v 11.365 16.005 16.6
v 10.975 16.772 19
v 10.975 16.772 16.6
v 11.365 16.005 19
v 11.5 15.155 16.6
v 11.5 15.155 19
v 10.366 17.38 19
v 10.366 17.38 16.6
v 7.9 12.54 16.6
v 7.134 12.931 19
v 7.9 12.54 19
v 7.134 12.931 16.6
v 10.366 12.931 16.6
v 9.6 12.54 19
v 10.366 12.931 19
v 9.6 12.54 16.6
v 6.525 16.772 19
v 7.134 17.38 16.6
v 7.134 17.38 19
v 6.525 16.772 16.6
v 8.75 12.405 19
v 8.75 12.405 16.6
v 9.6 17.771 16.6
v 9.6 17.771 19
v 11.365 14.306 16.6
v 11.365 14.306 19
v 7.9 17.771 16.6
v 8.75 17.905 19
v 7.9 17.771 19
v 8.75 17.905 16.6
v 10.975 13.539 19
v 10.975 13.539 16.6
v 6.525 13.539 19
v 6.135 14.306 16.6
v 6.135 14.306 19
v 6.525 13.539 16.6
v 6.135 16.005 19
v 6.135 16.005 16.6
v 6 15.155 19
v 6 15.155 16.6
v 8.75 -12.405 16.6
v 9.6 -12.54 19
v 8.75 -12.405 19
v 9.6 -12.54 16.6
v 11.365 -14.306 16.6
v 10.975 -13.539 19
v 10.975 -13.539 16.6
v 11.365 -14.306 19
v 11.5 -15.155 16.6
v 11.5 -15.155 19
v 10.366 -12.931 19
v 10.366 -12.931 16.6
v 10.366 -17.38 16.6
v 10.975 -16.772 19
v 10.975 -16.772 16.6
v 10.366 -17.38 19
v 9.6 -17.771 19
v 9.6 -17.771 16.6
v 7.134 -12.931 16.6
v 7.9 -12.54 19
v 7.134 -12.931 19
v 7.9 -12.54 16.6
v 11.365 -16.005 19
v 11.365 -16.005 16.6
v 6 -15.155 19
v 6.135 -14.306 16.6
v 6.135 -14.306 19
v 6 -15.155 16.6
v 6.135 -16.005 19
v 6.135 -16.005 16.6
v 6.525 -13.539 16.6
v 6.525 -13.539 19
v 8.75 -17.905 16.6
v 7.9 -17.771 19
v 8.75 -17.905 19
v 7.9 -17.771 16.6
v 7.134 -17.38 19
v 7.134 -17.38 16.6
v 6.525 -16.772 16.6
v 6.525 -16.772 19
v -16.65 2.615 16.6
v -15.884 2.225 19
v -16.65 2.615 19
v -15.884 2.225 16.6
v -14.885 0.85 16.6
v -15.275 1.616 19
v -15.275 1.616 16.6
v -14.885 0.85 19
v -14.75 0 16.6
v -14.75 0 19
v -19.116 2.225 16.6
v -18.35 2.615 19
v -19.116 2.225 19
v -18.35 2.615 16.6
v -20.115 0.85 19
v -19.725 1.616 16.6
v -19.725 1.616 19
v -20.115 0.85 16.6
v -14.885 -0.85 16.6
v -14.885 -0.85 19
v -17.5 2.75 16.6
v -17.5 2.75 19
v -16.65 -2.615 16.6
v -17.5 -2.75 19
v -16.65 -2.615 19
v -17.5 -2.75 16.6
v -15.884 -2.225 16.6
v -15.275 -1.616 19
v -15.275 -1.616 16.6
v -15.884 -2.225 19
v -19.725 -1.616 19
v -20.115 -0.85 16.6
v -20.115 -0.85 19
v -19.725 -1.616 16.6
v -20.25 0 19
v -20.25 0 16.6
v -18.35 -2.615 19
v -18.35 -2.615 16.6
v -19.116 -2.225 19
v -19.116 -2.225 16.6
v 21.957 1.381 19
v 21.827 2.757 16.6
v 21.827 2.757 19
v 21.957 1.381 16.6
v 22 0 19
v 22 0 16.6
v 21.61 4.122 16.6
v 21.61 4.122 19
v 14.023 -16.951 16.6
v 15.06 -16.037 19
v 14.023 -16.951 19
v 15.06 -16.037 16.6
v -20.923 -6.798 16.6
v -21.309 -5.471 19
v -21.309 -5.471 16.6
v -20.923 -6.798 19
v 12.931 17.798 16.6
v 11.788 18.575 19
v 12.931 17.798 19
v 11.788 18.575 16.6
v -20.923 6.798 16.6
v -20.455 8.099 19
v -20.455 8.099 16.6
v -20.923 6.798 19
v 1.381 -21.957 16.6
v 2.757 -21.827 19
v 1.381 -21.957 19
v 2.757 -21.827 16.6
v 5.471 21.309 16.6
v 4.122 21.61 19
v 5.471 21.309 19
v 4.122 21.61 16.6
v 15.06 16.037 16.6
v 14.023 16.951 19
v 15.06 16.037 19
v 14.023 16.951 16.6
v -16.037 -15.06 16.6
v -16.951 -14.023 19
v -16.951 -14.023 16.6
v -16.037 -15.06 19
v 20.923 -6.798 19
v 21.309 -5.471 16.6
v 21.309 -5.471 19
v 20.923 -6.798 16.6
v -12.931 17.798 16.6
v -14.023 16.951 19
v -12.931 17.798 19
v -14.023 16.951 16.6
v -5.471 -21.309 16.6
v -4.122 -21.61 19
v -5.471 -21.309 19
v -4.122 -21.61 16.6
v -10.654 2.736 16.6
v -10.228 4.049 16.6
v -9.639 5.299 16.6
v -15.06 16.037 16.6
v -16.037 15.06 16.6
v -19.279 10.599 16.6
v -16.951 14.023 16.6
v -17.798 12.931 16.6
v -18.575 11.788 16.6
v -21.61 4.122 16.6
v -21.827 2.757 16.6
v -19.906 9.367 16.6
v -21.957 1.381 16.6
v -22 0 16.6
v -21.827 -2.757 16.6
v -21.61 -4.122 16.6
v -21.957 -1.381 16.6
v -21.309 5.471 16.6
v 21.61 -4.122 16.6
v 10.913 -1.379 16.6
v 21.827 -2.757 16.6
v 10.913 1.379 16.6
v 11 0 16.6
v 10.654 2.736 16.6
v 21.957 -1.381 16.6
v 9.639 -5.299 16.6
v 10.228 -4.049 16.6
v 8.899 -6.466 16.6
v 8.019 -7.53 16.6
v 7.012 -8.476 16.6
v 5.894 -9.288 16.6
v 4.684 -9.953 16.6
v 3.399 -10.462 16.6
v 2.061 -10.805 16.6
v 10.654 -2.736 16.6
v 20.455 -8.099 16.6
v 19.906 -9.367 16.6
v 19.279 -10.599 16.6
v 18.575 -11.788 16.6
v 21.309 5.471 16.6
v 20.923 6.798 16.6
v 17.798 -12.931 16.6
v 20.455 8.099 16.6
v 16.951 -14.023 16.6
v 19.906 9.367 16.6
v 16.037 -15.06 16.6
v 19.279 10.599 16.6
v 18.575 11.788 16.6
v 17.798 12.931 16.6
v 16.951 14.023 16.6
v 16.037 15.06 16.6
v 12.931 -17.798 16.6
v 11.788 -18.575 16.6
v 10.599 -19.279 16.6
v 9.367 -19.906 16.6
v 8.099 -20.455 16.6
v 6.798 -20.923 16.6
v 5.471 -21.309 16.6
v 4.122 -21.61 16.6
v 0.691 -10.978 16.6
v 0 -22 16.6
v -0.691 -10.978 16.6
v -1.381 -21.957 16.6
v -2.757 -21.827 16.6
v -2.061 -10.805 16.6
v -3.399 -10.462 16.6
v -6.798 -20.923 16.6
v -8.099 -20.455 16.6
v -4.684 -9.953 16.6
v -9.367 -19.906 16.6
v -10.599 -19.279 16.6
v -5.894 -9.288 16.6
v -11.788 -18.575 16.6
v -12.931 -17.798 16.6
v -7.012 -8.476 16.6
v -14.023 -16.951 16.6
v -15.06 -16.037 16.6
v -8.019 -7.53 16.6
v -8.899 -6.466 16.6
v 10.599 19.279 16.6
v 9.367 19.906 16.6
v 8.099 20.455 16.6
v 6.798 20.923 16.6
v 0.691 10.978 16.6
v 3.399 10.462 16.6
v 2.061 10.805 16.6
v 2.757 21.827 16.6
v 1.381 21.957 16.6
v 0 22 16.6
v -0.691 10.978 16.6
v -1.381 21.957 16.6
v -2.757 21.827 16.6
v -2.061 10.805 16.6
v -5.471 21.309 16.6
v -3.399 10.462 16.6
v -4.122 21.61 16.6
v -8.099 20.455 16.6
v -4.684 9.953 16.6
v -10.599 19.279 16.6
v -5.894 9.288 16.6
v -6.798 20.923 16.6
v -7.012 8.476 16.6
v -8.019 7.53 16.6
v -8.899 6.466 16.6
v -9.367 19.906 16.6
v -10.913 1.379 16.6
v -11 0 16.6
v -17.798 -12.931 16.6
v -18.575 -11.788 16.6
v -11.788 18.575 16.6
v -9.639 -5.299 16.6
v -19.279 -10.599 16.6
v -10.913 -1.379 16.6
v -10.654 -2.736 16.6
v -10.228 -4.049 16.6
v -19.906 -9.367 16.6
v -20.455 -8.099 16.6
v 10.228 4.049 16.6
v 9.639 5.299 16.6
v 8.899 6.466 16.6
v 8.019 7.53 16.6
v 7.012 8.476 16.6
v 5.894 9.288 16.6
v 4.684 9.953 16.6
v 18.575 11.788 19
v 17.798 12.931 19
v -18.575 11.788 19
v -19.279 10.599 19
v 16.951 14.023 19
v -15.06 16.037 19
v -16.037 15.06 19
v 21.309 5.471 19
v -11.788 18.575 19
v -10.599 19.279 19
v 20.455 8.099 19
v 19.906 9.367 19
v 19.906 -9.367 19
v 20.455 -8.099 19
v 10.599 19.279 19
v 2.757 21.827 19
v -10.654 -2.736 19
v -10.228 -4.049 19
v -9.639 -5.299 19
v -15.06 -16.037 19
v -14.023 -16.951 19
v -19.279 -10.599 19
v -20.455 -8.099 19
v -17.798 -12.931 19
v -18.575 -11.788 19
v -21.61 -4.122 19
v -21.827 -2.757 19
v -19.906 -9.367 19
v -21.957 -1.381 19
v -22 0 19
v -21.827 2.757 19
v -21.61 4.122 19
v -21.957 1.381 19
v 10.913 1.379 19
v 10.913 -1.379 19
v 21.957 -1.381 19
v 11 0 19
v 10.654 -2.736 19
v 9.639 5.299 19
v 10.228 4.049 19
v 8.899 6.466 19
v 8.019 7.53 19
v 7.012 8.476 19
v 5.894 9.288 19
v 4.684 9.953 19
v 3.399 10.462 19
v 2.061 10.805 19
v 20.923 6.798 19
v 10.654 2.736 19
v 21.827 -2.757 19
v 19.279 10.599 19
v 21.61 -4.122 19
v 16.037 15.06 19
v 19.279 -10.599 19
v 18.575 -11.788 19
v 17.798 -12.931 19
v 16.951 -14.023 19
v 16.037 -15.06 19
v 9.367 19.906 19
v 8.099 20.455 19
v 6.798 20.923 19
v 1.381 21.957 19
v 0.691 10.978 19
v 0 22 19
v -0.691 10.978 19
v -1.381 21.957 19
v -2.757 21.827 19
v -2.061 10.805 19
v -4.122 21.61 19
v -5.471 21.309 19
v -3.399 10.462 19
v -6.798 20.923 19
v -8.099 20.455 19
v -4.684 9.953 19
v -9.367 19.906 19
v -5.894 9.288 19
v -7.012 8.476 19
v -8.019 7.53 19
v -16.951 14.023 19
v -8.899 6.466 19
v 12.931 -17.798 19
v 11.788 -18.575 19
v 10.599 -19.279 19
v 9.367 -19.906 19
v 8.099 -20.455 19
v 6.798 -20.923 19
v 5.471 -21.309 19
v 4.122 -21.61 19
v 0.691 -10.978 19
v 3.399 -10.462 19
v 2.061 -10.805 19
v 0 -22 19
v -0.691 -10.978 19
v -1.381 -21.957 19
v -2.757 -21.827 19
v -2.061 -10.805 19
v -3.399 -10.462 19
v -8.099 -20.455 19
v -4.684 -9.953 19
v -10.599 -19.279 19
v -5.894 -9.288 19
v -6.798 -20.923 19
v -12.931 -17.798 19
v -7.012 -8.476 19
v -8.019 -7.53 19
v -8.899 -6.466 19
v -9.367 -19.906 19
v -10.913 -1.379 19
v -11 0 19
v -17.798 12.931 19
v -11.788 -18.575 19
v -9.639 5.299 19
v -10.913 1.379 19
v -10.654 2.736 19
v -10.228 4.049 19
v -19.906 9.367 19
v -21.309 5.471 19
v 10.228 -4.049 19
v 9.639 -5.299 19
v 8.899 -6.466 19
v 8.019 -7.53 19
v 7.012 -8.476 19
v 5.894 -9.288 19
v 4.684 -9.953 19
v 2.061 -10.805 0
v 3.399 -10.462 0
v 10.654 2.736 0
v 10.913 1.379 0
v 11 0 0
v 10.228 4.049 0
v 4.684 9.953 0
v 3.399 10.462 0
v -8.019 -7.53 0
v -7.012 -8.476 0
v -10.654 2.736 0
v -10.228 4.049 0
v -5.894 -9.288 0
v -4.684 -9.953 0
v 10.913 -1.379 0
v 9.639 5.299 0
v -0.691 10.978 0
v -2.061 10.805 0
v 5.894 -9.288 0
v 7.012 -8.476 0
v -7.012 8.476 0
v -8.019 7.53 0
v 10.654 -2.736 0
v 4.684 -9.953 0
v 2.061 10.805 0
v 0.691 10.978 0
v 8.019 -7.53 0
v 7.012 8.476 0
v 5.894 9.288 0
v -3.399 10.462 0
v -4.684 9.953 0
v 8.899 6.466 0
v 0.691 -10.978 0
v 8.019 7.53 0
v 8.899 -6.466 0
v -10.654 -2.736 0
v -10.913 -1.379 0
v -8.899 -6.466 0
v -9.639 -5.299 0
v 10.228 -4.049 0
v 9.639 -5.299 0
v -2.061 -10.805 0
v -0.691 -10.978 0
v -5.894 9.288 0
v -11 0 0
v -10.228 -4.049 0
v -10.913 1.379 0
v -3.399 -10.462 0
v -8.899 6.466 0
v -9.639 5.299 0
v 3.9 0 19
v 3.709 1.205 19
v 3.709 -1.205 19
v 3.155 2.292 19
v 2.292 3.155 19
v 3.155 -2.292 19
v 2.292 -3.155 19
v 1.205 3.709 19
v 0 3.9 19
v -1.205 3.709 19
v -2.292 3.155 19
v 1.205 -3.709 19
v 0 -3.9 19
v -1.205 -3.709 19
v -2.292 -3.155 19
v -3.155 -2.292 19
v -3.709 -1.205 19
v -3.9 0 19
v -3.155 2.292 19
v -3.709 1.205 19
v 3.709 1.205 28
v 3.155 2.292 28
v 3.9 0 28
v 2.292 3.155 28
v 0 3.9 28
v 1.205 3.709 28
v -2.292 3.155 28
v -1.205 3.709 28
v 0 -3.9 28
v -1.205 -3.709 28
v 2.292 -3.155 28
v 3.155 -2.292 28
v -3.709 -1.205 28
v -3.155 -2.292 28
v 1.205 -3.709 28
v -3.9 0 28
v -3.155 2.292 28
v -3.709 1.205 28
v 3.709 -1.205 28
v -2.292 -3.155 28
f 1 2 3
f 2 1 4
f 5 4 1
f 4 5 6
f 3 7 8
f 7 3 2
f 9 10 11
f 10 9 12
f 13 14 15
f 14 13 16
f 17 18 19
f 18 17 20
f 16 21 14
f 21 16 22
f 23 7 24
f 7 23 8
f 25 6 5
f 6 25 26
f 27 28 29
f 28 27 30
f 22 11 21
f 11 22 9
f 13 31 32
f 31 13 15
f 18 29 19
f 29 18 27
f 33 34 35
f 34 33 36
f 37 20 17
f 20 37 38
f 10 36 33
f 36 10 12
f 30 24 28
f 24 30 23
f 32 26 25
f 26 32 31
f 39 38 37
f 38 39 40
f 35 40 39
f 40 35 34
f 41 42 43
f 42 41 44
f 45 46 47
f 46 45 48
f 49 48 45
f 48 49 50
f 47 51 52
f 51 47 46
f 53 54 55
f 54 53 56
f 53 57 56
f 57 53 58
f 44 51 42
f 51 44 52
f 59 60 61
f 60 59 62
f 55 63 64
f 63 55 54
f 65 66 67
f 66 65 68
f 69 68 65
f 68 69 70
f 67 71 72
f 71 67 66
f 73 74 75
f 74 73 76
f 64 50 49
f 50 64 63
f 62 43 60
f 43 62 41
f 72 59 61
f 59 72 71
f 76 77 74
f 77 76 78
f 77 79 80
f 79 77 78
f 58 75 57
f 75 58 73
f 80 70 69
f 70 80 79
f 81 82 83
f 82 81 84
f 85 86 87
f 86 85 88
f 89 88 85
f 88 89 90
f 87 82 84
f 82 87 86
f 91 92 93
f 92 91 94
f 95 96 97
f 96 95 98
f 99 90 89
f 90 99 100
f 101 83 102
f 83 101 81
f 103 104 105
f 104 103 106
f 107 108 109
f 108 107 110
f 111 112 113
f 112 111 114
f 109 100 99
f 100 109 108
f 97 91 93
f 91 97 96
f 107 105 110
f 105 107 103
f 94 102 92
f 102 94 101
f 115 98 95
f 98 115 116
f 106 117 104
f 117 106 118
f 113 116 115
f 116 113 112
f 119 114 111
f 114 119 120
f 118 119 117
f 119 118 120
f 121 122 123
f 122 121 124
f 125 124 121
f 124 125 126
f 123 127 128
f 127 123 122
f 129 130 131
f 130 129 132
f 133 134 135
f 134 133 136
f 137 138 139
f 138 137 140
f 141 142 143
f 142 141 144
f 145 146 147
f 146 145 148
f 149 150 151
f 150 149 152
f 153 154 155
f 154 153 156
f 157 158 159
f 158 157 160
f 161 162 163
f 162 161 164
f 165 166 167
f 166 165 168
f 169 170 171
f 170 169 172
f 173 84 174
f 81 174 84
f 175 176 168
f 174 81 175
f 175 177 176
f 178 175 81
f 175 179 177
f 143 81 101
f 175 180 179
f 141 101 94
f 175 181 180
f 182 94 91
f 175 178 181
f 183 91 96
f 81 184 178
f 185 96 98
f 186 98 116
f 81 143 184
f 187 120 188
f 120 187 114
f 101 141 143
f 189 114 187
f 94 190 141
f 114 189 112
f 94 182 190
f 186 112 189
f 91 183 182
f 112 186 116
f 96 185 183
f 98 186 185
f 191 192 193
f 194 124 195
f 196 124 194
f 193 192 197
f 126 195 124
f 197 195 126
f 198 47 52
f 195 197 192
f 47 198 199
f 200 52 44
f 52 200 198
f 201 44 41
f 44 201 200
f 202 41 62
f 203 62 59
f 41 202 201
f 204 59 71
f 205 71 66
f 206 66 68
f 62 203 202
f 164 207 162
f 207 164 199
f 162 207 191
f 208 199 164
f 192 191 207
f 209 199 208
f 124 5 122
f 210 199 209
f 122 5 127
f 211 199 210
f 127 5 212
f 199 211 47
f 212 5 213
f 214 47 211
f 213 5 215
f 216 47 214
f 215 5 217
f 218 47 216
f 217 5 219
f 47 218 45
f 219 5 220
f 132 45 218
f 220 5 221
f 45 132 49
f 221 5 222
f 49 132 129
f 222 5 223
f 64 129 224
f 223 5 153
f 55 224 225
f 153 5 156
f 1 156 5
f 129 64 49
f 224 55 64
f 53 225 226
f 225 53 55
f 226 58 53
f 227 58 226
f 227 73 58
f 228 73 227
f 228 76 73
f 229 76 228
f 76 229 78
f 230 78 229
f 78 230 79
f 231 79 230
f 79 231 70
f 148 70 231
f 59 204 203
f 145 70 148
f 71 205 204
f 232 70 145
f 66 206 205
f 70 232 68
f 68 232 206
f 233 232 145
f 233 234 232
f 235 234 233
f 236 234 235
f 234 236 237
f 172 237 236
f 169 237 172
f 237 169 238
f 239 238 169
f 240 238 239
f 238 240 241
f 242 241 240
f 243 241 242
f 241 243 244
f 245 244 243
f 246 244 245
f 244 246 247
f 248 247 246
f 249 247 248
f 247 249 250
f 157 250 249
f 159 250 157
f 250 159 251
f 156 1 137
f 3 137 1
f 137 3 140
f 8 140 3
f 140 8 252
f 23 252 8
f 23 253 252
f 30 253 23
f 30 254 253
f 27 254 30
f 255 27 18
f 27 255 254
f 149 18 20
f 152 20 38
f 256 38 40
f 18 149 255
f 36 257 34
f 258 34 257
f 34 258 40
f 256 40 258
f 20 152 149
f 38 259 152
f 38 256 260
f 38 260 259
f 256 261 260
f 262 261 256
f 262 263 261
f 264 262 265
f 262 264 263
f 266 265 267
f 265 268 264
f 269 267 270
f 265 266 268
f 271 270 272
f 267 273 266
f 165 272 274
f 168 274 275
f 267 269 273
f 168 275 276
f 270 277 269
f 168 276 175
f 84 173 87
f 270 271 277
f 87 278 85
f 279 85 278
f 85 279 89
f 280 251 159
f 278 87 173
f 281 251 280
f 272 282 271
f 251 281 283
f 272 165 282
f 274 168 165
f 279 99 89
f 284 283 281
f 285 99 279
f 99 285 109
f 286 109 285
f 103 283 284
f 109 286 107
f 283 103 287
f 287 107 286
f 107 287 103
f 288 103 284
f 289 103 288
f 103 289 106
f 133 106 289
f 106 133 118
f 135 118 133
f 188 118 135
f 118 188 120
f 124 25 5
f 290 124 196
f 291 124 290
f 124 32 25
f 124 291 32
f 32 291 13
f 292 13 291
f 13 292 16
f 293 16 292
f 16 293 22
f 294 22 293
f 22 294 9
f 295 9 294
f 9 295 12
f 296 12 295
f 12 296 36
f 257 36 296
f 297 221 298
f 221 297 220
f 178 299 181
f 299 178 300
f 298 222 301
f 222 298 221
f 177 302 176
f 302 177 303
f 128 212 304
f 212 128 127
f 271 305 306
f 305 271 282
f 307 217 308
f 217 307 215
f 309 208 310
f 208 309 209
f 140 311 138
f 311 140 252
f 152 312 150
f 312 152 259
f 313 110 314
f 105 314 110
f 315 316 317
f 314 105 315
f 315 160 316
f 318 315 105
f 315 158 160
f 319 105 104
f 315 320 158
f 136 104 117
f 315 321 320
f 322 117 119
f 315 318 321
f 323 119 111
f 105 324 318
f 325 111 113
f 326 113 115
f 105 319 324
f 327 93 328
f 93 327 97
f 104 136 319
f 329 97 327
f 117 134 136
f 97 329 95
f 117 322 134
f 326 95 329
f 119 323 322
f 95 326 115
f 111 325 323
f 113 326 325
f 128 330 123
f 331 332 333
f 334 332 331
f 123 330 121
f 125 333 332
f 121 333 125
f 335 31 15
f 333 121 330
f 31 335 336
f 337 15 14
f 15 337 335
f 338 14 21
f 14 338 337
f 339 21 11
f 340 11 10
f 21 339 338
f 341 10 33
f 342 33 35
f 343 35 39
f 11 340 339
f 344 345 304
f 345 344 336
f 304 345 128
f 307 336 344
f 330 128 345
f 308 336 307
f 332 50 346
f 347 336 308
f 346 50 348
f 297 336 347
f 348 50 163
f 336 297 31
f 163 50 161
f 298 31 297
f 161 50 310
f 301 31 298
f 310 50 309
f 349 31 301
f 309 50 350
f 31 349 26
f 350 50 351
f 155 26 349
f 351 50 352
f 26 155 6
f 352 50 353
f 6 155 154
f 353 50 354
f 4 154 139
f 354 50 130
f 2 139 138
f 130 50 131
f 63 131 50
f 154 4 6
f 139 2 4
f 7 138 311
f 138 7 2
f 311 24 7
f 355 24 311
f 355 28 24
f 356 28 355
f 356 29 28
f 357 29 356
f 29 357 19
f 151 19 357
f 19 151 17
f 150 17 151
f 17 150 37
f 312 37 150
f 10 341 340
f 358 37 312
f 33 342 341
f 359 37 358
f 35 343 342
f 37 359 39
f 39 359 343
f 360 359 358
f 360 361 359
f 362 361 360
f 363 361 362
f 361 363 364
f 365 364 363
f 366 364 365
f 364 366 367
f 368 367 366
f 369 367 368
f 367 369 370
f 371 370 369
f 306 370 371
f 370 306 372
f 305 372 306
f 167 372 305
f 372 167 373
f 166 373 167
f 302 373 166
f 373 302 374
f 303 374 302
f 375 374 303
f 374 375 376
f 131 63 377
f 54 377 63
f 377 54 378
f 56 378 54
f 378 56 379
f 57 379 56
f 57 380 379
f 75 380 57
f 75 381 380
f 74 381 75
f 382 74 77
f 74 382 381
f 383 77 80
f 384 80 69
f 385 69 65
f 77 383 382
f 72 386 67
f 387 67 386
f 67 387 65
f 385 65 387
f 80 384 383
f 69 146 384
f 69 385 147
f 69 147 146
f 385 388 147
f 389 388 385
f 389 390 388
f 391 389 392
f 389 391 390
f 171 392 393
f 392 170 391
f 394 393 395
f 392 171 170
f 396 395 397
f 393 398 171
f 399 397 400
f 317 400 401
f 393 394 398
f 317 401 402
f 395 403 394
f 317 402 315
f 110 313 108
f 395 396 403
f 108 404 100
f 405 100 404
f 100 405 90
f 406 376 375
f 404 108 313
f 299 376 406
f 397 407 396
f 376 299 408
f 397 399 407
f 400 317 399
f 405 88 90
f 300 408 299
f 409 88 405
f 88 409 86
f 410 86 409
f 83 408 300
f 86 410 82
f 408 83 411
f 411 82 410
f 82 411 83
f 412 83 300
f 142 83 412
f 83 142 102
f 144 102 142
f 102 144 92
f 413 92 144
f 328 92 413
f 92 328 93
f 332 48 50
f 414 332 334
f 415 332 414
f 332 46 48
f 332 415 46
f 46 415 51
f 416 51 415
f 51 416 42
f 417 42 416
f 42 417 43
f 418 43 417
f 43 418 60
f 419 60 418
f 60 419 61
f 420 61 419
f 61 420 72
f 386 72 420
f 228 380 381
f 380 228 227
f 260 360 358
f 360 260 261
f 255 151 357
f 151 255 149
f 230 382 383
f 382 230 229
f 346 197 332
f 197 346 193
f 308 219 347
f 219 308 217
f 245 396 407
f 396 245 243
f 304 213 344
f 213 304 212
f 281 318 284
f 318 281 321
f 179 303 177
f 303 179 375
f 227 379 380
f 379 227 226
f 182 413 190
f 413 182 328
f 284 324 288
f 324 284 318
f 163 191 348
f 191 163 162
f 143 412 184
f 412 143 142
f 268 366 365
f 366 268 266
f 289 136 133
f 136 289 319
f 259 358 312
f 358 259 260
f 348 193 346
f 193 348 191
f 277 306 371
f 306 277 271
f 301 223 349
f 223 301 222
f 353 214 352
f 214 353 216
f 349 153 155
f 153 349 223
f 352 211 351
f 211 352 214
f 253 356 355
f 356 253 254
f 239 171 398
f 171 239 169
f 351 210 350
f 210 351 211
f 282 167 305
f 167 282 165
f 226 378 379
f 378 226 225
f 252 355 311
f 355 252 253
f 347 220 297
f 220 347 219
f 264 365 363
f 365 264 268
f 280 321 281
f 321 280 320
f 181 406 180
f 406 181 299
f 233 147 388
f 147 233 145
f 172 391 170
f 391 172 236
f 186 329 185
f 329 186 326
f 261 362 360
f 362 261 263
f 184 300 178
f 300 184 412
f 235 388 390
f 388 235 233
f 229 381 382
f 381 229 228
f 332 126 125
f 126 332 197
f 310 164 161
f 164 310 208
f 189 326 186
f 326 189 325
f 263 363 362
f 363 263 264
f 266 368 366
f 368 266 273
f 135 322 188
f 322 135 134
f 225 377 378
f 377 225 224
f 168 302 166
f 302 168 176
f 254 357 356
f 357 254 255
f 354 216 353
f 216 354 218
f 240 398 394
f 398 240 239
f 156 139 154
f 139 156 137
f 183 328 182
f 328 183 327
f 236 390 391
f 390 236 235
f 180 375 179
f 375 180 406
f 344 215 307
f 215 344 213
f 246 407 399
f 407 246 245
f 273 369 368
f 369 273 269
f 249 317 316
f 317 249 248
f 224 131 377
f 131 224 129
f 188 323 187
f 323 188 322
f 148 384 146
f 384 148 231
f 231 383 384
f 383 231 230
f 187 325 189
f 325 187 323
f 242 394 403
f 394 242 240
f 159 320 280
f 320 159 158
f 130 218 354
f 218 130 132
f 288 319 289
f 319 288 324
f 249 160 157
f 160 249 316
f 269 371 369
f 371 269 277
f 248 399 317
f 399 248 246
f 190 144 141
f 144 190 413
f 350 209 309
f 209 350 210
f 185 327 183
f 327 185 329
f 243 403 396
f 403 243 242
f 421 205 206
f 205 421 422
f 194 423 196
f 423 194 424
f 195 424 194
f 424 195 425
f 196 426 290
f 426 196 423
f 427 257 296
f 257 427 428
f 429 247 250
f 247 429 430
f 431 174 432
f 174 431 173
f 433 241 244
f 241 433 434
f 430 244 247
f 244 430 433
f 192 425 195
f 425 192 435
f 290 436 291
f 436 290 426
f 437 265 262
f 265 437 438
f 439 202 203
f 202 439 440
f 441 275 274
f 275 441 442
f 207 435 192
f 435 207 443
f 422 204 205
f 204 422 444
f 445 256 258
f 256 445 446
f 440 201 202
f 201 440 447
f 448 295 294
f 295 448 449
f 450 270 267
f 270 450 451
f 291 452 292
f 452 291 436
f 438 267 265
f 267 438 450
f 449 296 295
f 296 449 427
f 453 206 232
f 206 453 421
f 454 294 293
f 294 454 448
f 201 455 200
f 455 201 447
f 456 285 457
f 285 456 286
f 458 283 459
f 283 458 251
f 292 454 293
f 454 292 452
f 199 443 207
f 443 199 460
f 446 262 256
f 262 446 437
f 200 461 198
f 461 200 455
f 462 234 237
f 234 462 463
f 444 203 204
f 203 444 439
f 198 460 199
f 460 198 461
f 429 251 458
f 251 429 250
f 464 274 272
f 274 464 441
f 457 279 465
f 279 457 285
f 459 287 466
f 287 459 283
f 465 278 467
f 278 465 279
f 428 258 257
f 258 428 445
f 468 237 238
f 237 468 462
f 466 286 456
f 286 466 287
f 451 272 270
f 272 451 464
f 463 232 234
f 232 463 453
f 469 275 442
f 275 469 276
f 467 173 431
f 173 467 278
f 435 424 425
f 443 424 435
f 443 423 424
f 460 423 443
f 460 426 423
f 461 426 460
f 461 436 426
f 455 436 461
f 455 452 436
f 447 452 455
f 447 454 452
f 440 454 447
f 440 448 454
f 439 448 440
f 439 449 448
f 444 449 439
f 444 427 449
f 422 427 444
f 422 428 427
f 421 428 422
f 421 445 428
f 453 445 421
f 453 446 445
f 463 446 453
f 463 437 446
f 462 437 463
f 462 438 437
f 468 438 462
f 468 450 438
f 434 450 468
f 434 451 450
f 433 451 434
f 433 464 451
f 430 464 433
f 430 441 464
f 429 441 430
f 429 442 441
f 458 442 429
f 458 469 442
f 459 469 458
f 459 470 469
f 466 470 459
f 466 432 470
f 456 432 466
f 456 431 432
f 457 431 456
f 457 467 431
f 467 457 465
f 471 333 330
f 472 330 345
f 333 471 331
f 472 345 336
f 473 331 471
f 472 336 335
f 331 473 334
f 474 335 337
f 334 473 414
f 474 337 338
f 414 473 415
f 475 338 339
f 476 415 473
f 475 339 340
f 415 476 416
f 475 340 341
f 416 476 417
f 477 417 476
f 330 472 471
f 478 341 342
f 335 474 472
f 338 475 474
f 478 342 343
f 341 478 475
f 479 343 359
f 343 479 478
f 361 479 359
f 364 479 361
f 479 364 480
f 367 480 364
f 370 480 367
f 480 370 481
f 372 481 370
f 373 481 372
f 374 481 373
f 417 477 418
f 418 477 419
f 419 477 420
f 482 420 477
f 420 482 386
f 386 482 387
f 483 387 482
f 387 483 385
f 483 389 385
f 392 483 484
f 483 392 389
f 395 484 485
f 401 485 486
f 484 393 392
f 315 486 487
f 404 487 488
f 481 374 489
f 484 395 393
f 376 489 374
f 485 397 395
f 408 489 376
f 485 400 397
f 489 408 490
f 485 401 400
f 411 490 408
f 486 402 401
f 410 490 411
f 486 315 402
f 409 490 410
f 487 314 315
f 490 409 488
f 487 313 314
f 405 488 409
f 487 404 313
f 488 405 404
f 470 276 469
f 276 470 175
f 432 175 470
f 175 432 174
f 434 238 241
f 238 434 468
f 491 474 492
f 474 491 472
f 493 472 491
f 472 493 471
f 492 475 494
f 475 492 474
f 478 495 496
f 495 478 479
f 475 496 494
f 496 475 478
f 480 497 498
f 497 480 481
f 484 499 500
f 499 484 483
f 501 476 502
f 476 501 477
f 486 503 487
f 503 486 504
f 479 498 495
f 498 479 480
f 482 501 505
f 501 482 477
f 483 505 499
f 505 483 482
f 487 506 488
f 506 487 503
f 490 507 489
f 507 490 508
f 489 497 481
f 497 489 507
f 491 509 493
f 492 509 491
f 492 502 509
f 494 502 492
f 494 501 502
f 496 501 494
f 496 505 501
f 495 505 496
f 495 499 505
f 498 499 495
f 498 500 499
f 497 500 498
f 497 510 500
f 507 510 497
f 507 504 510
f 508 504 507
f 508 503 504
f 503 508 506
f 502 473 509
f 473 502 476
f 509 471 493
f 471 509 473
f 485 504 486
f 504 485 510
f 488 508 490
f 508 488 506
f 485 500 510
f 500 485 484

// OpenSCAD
// file: params_basic_components.scad
// Author: Mihai Oltean, www.tcreate.org, mihai.oltean@gmail.com
// More details: jenny5.org
// Source: github.com/jenny5-robot
// MIT License
//--------------------------------------------------------------

spring_length = 20;

smooth_rod_8_radius = 4;
smooth_rod_10_radius = 5;
smooth_rod_12_radius = 6;

tolerance = 0.1;
display_tolerance = 1;

overlap_tolerance = 0.01;


wall_thick_1 = 1;
wall_thick_2 = 2;
wall_thick_3 = 3;
wall_thick_4 = 4;
wall_thick_5 = 5;
wall_thick_5_5 = 5.5;
wall_thick_6 = 6;
wall_thick_7 = 7;
wall_thick_8 = 8;
wall_thick_9 = 9;
wall_thick_10 = 10;
wall_thick_12 = 10;

wrench_radius = 11;

ghidaj_radius = 4;
ghidaj_radius_12 = 6;

canal_diameter = 8.22;
canal_height = 2.2;

filament_radius = 0.9;

bowden_tube_radius = 2.5;

m3_tolerance = 0.1;

latura_mare_L = 40;
latura_mica_L = 15;
grosime_perete_L = 3;

latura_L_50x50 = 50;
latura_L_40x40 = 40;

latura_U_50x50 = 50;
latura_U_40x40 = 40;


tolerance_z = [0, 0, tolerance];
tolerance_x = [tolerance, 0, 0];
tolerance_y = [0, tolerance, 0];

display_tolerance_z = [0, 0, display_tolerance];
display_tolerance_x = [display_tolerance, 0, 0];
display_tolerance_y = [0, display_tolerance, 0];

display_tolerance_xz = [display_tolerance, 0, display_tolerance];
display_tolerance_xy = [display_tolerance, display_tolerance, 0];
display_tolerance_yz = [0, display_tolerance, display_tolerance];
// file: params_slip_rings.scad
SRC022A_6_stator_length = 19;
SRC022A_6_stator_radius = 11;
SRC022A_6_flange_radius = 22;
SRC022A_6_rotor_radius = 3.9;
SRC022A_6_rotor_length = 9;
SRC022A_6_flange_thickness = 2.4;
SRC022A_6_flange_holes_radius = 2.75;
SRC022A_6_flange_holes_position_radius = 17.5;

SRC022A_6_flange_holes_position = [
[SRC022A_6_flange_holes_position_radius * sin(30), SRC022A_6_flange_holes_position_radius * cos(30), 0],
[SRC022A_6_flange_holes_position_radius * sin(150), SRC022A_6_flange_holes_position_radius * cos(150), 0],
[SRC022A_6_flange_holes_position_radius * sin(270), SRC022A_6_flange_holes_position_radius * cos(270), 0]
];
// main file
include <params_slip_rings.scad>
include <params_basic_components.scad>


//----------------------------------------------------------
module SRC022A_6()
{
    // stator
    color("black") cylinder(h = SRC022A_6_stator_length, r = SRC022A_6_stator_radius, $fn = 50);
    // flange
    
    color("black") 
    translate([0, 0, SRC022A_6_stator_length - SRC022A_6_flange_thickness]) 
    difference(){
    cylinder (h = SRC022A_6_flange_thickness, r = SRC022A_6_flange_radius, $fn = 100);
      for (i=[0:2])
        translate (SRC022A_6_flange_holes_position[i] - display_tolerance_z) cylinder (h = SRC022A_6_flange_thickness + 2 * display_tolerance, r = SRC022A_6_flange_holes_radius, $fn = 20); 
    }
    // rotor
    color("black") 
    translate([0, 0, SRC022A_6_stator_length]) cylinder (h = SRC022A_6_rotor_length, r = SRC022A_6_rotor_radius, $fn = 20);
}
//----------------------------------------------------------

SRC022A_6();
